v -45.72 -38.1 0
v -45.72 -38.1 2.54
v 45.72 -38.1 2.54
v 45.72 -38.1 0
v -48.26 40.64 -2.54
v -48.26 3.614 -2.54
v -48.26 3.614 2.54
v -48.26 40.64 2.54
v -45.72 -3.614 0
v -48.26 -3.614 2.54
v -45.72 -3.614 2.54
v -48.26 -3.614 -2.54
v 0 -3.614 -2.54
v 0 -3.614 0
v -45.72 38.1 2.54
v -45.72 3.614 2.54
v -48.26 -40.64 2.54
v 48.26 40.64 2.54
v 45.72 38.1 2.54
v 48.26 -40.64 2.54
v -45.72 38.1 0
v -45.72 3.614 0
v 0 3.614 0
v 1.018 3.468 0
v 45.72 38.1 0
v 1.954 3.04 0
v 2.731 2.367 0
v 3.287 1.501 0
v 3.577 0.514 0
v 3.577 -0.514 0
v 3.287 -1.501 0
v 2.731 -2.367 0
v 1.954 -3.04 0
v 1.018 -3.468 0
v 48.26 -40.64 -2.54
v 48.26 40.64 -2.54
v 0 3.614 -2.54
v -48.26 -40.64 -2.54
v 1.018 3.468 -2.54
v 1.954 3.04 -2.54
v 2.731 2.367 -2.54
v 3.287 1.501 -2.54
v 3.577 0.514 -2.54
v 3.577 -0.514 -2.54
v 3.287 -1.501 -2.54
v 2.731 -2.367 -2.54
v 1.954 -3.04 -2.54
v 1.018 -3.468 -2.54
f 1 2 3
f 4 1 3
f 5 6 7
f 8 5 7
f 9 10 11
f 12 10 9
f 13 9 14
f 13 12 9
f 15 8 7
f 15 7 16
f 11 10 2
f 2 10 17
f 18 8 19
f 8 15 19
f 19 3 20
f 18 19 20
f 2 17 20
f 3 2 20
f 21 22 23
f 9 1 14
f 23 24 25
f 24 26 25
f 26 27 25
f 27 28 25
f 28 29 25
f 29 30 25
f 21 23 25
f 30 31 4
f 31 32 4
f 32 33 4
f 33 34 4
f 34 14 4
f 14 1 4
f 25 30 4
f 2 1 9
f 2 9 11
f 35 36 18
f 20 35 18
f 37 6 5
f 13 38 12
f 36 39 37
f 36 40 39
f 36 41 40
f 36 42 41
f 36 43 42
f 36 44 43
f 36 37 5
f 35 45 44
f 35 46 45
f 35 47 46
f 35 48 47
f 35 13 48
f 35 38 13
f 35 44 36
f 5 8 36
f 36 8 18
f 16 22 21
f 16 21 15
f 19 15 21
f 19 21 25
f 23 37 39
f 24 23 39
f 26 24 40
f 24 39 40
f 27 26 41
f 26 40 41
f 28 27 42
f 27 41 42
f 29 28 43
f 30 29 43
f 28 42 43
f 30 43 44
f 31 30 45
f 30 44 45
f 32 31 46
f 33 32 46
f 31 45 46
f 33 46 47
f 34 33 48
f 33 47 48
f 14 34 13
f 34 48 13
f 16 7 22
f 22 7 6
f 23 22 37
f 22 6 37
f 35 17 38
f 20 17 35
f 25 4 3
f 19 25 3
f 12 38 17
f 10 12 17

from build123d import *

# Parameters (mm, degrees)
F0_W     = 96.52
F0_H     = 5.08
F1_DEPTH = 40.64
F2_T     = -2.54
F3_W     = 48.26
F3_H     = 7.2280052118
F4_DEPTH = 5.081


with BuildPart() as f1:
    # F0 (on Front) → F1 (new body, symmetric)
    with BuildSketch(Plane.XZ):
        Rectangle(F0_W, F0_H)
    extrude(amount=F1_DEPTH, both=True)

    # F2
    f2_openings = [f1.faces().sort_by_distance(p)[0] for p in [
        (0, 0, 2.54),
    ]]
    offset(amount=F2_T, openings=f2_openings)

    # F3 (on face) → F4 (cut, through all)
    with BuildSketch(Plane(origin=(0, 0, -2.54), x_dir=(1, 0, 0), z_dir=(0, 0, -1))):
        with BuildLine():
            ThreePointArc((0, -3.6140026059), (3.6140026059, 0), (0, 3.6140026059))
            Line((0, 3.6140026059), (0, -3.6140026059))
        make_face()
        with Locations((-24.13, 0)):
            Rectangle(F3_W, F3_H)
    extrude(amount=-F4_DEPTH, mode=Mode.SUBTRACT)


solid = f1.part
